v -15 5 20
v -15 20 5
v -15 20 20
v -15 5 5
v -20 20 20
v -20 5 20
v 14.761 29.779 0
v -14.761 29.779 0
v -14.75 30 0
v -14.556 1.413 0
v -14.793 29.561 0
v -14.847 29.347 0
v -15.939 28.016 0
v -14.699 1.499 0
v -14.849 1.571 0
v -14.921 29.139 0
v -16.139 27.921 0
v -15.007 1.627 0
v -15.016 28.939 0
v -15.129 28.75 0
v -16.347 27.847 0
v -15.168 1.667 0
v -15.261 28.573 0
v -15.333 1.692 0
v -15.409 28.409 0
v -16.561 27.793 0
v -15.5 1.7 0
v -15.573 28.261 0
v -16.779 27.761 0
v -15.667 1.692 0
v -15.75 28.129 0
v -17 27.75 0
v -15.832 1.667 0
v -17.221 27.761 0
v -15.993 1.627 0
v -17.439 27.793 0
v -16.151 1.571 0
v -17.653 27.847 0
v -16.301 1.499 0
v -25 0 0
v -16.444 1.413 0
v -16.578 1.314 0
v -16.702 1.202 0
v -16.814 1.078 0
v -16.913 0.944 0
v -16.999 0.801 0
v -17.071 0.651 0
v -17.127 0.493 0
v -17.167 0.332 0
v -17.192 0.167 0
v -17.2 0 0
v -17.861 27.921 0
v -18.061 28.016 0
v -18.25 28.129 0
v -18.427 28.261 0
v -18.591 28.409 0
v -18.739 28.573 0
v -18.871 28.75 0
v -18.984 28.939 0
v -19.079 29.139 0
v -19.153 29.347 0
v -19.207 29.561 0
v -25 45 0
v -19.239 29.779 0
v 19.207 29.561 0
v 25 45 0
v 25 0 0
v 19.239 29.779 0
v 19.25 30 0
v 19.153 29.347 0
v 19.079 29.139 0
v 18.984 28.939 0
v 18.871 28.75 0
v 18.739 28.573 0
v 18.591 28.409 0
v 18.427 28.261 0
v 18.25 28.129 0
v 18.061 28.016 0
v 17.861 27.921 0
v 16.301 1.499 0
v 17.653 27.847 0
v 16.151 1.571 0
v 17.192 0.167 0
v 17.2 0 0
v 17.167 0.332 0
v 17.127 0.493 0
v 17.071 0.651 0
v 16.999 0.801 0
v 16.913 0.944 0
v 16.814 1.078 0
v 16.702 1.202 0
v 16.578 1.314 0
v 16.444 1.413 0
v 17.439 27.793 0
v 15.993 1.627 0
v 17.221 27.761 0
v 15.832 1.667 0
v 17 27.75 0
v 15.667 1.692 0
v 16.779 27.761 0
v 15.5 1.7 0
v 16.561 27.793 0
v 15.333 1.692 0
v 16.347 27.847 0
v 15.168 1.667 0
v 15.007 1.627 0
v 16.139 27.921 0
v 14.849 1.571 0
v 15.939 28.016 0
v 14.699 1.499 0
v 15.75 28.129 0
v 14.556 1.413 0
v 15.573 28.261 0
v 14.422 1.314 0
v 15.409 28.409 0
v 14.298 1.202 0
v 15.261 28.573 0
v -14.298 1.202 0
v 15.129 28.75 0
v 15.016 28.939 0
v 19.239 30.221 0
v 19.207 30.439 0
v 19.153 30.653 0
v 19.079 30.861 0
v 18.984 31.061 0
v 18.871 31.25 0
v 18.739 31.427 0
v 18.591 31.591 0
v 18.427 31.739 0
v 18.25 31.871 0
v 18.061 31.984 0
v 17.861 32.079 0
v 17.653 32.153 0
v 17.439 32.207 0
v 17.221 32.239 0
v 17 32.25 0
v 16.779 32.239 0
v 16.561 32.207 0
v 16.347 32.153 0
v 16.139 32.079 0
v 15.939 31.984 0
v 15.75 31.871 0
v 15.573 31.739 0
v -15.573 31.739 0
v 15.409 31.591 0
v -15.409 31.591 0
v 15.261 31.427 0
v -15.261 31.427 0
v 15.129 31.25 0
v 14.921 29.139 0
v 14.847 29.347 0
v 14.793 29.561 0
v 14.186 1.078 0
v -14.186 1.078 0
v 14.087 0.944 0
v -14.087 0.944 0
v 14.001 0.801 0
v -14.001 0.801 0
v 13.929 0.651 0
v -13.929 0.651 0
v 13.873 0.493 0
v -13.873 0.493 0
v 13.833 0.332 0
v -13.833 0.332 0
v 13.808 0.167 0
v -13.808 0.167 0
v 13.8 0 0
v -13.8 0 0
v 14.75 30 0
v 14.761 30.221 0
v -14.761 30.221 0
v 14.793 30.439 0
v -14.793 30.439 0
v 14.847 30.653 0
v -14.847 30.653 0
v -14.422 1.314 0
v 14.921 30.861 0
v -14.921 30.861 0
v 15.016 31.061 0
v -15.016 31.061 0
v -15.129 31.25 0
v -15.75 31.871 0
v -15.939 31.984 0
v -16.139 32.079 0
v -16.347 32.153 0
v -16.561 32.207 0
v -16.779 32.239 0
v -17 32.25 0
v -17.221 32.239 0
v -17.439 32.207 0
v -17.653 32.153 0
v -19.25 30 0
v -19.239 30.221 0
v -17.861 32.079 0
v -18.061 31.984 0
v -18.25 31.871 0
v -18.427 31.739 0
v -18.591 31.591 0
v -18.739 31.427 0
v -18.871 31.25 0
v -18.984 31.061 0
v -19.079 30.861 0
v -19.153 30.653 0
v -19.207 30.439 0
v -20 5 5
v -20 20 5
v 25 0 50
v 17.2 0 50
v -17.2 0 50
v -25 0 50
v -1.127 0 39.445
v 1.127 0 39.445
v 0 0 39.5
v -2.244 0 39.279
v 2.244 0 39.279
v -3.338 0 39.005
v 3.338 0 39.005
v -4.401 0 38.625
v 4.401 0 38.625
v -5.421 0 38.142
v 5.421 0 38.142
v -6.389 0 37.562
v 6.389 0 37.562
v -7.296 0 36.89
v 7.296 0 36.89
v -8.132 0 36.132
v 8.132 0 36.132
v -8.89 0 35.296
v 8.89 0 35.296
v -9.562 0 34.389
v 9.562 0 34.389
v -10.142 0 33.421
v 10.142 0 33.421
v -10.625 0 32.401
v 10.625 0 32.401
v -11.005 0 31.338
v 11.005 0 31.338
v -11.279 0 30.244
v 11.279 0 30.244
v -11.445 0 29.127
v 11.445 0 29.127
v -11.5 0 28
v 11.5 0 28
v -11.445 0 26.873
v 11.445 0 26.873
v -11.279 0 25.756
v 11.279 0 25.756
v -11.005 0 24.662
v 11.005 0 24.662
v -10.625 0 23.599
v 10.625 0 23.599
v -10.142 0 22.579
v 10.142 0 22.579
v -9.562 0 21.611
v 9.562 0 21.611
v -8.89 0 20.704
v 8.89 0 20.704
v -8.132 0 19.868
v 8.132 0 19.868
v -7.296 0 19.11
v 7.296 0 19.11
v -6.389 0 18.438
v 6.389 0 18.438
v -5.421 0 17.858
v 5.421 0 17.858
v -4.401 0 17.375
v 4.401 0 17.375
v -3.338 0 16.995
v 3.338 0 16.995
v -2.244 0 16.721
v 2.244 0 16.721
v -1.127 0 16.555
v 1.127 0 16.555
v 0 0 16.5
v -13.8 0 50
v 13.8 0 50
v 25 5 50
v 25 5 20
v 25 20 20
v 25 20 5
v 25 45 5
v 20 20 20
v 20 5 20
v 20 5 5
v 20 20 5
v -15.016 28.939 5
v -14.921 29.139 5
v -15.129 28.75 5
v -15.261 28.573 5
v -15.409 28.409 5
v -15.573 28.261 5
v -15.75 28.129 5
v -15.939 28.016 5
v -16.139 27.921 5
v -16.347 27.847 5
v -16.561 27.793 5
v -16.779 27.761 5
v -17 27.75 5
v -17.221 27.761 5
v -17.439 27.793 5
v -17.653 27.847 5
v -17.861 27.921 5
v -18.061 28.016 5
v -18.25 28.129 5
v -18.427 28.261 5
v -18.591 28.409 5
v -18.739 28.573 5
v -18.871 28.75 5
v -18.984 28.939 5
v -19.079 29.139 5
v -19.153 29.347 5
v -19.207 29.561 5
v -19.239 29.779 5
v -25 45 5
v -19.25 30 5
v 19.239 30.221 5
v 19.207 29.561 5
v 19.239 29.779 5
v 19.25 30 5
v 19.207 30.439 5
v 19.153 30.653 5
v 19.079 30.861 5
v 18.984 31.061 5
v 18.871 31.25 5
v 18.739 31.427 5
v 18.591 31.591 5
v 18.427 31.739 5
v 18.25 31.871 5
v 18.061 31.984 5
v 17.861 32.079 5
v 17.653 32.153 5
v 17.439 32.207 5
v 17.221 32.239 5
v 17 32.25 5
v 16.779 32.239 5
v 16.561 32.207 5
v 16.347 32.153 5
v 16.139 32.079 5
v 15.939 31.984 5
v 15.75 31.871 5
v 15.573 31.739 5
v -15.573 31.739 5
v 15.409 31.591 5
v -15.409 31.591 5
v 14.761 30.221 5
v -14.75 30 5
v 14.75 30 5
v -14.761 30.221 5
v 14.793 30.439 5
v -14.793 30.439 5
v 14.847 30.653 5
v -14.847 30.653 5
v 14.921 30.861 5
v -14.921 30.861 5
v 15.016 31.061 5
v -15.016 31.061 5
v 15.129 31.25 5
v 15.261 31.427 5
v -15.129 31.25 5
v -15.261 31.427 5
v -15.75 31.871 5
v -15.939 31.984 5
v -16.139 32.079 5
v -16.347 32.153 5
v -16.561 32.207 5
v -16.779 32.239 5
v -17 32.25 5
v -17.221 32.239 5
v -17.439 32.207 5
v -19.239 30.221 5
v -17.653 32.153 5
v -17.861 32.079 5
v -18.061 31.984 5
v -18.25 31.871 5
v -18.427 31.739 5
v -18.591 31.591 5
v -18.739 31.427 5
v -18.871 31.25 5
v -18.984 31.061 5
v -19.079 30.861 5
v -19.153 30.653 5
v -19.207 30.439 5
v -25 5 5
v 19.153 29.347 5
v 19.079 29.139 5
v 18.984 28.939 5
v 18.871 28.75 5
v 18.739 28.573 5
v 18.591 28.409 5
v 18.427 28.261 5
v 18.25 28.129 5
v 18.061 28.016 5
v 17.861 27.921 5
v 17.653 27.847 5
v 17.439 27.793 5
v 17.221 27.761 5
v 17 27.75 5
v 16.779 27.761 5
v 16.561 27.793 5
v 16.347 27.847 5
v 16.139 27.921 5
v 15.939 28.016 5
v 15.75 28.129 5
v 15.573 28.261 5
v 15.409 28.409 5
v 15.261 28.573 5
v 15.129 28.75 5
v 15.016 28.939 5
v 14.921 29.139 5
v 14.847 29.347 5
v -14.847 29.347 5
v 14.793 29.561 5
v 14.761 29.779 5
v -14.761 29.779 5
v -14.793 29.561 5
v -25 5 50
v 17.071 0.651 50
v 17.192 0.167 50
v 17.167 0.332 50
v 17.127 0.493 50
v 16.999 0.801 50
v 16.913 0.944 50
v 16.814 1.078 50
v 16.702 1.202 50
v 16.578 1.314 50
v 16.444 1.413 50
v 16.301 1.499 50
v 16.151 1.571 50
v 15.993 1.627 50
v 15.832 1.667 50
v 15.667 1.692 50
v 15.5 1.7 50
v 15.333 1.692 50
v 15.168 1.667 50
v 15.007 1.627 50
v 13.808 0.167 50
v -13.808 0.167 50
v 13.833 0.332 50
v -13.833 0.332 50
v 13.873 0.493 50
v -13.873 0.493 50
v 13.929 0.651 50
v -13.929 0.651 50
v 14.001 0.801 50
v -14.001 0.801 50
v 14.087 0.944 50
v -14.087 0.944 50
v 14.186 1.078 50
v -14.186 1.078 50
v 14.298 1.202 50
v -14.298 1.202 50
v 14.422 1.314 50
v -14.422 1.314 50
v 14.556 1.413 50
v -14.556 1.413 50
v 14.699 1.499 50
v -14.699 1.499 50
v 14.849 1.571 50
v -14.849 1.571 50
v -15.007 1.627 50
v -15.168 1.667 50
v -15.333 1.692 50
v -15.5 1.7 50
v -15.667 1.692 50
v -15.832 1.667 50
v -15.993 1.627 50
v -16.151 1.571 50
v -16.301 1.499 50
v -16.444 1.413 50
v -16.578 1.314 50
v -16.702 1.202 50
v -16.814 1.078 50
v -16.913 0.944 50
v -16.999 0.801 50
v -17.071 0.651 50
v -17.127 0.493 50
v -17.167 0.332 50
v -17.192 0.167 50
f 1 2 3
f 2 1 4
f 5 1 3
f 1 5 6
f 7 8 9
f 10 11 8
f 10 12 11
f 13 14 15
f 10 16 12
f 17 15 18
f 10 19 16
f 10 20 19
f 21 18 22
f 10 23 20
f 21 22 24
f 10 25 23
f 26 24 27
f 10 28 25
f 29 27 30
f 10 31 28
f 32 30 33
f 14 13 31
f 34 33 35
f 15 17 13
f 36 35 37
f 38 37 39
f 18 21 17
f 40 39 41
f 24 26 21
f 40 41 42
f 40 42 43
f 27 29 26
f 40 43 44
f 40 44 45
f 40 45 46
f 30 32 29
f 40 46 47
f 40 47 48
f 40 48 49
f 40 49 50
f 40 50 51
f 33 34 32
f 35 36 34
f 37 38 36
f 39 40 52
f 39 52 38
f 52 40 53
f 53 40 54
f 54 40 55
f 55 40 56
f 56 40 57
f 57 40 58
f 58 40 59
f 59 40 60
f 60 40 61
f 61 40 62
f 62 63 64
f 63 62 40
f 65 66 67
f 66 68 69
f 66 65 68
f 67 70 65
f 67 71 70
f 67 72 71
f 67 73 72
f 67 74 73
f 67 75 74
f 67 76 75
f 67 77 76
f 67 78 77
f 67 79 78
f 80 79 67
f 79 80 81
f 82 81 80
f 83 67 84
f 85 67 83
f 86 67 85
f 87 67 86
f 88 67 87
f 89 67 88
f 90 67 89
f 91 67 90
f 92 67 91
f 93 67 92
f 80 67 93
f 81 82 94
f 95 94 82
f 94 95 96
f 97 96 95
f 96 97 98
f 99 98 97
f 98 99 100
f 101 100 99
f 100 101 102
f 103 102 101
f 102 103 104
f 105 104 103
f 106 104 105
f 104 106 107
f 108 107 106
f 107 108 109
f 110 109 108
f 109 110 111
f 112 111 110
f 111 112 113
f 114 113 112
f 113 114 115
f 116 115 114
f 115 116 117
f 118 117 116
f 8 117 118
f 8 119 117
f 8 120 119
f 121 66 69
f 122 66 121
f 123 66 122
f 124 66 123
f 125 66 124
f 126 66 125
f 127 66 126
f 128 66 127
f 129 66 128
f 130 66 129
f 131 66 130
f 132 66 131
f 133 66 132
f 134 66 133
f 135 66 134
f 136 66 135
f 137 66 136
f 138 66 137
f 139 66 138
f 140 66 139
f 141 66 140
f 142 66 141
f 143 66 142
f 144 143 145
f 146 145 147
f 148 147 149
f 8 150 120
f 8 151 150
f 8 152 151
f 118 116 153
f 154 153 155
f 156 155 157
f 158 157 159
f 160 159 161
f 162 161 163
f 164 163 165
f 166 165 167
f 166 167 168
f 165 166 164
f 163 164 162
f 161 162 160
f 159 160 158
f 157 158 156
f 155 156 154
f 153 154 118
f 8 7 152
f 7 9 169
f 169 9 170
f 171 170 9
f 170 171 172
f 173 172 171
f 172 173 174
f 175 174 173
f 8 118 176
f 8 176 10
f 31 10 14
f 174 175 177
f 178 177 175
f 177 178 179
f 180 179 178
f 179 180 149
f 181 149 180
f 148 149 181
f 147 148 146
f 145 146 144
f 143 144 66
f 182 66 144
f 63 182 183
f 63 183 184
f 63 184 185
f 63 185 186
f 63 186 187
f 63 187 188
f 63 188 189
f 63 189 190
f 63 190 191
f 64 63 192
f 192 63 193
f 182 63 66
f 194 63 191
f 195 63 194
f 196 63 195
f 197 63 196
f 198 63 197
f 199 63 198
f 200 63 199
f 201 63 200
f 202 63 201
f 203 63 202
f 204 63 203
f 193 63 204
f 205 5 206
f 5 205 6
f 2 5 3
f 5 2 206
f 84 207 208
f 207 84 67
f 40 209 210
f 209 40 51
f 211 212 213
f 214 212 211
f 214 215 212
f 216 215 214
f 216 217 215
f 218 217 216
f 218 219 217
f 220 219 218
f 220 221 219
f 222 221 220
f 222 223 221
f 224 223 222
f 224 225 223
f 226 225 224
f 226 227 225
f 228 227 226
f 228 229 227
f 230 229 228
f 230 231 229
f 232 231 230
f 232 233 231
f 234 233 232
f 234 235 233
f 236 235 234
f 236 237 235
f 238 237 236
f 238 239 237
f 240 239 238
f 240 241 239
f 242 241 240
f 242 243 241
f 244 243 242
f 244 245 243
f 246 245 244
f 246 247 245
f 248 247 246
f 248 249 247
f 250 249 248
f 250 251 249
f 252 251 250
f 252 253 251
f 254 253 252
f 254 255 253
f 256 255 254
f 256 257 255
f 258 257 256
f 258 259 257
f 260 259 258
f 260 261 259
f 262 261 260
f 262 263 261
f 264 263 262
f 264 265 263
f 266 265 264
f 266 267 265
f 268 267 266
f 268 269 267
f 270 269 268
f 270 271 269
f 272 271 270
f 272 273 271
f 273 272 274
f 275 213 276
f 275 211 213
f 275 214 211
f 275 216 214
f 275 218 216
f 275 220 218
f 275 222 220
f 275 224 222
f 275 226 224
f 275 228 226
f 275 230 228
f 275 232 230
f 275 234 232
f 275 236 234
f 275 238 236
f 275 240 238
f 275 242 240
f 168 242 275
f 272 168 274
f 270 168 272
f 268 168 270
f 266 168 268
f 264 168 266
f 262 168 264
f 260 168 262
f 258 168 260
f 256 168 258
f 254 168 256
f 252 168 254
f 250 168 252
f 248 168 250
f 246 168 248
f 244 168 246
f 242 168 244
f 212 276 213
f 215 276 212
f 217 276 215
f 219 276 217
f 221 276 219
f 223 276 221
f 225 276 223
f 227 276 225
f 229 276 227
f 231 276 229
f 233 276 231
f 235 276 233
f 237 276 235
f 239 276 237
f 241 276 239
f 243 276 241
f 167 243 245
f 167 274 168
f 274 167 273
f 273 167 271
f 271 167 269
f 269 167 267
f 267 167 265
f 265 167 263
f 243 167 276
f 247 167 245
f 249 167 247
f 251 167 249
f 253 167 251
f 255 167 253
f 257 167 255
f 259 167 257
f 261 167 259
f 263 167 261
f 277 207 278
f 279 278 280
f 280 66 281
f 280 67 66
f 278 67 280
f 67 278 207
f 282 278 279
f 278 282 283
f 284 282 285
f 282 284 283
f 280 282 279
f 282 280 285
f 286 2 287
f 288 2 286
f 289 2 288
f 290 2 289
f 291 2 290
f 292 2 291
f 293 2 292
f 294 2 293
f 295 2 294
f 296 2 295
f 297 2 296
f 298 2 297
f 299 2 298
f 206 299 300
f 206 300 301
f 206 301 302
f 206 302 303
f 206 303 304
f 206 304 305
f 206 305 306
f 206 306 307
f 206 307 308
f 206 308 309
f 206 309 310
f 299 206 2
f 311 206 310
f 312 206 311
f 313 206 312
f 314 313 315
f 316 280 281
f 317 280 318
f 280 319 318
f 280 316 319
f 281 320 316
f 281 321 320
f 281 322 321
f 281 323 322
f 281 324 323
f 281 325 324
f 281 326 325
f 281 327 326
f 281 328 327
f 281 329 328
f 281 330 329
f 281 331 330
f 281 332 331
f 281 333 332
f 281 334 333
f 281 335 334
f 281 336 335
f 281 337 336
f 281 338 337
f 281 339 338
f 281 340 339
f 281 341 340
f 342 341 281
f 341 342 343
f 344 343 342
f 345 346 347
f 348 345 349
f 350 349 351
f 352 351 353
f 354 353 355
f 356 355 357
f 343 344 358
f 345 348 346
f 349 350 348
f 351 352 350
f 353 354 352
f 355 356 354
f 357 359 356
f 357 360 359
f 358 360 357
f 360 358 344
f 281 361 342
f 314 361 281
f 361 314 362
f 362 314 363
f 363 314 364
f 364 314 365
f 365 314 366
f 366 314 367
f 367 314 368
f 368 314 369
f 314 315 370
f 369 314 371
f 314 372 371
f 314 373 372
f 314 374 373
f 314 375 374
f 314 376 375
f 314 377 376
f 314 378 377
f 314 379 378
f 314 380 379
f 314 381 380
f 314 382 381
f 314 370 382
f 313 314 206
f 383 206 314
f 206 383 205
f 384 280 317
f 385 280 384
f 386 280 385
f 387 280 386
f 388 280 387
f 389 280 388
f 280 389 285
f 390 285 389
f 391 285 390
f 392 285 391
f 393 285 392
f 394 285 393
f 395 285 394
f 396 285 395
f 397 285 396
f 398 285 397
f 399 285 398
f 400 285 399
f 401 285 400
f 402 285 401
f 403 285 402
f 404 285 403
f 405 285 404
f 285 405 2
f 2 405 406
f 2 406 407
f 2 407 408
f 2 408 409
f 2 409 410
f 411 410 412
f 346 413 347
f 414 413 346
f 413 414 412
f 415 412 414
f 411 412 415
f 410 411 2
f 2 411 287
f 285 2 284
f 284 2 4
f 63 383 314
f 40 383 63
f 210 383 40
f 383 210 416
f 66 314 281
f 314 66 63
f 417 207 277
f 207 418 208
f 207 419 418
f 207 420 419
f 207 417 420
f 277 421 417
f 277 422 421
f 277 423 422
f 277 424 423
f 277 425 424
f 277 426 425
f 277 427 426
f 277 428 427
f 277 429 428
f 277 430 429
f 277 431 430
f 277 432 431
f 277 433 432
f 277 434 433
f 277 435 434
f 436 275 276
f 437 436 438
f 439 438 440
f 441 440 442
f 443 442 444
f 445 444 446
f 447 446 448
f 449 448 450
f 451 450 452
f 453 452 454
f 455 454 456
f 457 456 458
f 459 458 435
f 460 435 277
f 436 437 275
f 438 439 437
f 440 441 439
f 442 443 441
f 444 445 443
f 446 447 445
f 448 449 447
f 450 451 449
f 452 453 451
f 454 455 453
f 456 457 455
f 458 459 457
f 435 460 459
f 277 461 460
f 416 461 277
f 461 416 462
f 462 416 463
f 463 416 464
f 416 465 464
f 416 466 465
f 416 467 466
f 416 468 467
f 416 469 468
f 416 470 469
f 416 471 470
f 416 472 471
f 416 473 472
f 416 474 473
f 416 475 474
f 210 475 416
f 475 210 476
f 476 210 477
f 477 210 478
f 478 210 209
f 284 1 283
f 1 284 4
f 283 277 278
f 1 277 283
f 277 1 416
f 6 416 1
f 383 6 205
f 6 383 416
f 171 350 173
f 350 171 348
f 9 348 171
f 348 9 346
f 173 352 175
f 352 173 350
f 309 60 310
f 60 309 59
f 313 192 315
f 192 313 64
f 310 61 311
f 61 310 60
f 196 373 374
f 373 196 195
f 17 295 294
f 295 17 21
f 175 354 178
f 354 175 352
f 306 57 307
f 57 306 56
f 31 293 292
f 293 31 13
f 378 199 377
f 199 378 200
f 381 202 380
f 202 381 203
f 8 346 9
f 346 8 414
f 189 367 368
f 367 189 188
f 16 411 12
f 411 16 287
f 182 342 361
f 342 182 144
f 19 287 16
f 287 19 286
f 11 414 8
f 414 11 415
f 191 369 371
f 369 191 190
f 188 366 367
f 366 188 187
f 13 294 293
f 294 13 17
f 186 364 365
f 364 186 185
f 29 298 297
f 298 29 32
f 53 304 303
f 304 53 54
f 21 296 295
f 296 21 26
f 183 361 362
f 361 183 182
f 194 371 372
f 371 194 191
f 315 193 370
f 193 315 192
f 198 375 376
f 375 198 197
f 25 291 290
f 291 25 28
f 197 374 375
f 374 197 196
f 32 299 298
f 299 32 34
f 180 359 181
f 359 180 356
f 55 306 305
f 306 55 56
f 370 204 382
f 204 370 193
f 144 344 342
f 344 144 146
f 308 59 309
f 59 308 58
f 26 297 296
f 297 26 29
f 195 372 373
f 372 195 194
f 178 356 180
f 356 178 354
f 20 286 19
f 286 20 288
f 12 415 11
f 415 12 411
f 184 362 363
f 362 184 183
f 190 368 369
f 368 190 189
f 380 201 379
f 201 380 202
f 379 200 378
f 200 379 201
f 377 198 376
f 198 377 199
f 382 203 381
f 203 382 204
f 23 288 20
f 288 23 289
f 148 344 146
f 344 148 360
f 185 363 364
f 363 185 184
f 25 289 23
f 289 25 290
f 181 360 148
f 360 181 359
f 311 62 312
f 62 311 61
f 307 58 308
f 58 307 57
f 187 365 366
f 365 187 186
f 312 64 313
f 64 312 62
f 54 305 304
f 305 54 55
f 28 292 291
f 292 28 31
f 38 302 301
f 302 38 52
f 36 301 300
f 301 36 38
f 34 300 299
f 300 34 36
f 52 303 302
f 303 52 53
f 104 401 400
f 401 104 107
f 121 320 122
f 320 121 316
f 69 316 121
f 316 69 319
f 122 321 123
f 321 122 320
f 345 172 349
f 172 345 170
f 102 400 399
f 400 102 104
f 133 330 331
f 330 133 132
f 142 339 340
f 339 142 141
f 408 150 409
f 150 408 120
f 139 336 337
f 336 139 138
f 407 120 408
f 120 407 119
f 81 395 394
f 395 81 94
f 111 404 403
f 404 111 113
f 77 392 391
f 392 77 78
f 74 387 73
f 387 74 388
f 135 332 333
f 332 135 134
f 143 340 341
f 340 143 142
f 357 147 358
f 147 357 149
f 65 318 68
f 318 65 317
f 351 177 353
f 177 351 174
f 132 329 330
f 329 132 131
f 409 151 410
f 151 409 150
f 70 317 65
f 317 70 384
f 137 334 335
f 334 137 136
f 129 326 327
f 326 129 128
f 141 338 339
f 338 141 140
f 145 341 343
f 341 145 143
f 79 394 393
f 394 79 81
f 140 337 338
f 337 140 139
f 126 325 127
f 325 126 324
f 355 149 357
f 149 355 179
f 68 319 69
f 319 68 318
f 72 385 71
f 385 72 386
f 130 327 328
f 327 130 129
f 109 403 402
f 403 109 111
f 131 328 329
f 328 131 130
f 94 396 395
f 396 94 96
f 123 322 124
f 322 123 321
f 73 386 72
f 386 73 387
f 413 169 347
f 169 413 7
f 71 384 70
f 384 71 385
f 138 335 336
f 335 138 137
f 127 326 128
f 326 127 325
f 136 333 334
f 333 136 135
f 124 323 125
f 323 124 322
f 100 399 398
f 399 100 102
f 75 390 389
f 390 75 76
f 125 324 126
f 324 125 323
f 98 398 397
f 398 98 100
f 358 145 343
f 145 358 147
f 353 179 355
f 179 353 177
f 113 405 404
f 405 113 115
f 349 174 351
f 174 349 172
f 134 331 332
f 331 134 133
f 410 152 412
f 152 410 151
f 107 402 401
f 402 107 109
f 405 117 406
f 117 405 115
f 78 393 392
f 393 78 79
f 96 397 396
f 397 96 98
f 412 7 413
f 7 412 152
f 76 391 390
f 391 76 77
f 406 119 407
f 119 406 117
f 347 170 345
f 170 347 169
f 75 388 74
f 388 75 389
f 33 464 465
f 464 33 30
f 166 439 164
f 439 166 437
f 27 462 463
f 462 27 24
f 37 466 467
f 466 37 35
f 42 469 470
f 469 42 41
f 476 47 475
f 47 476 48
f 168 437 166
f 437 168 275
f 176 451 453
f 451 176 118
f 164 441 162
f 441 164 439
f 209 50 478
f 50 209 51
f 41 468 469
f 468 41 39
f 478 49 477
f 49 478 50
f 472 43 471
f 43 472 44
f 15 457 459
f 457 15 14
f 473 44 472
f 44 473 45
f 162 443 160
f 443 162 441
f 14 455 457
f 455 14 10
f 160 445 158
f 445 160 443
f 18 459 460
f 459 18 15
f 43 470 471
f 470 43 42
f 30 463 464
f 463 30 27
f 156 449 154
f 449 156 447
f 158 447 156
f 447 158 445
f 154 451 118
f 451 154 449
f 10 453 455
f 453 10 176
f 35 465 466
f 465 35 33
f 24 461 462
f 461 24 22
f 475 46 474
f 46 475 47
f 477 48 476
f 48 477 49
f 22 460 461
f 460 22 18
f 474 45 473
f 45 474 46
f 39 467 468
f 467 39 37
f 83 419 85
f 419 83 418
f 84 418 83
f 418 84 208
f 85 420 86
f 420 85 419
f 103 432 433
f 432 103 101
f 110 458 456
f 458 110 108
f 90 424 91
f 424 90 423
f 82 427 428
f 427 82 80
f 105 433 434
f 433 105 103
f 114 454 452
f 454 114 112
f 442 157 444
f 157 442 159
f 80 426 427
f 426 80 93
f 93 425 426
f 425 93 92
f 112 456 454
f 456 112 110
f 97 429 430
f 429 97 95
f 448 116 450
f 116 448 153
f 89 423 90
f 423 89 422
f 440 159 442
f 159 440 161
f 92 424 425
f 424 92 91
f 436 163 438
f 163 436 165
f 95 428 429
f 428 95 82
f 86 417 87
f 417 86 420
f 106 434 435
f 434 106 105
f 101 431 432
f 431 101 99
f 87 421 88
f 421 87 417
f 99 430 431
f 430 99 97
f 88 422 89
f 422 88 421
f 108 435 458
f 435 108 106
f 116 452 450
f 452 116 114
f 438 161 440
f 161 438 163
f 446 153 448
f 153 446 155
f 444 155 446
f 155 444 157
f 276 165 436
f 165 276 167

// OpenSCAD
// L-shaped mounting bracket for a NEMA 17 stepper motor (e.g. syringe pump)
// Print orientation: base plate on the bed, motor plate building upward (+Z)

$fn = 64;

// ---------------- Dimensions (mm) ----------------
// Base plate
base_x0      = -25;   // plate x start
base_x1      = 25;    // plate x end
base_y0      = 0;     // plate y start
base_y1      = 45;    // plate y end
base_z       = 5;     // plate thickness (z)

// Motor plate
motor_x0     = -25;   // plate x start
motor_x1     = 25;    // plate x end
motor_y0     = 0;     // plate y start
motor_y1     = 5;     // plate y end
motor_z      = 50;    // plate height (z)

// Through-holes
hole_m4_x1   = -17;   // M4 hole x position (left)
hole_m4_y    = 30;    // M4 hole y position
hole_m4_d    = 4.5;   // M4 hole diameter
hole_m4_x2   = 17;    // M4 hole x position (right)

// Boss hole (motor centring boss)
boss_d       = 23;    // boss hole diameter
boss_x       = 0;     // boss hole centre x
boss_z       = 28;    // boss hole centre z

// Screw holes (M3, on square pattern)
screw_d      = 3.4;   // screw hole diameter
screw_pitch  = 31;    // square pattern side length
screw_count  = 4;     // number of screw holes

// Gussets
gusset_t     = 5;     // gusset thickness (x)
gusset_leg   = 20;    // right triangle leg length (along +Y and +Z)

// ---------------- Model ----------------
difference() {
    union() {
        // Base plate
        translate([base_x0, base_y0, 0])
            cube([base_x1 - base_x0, base_y1 - base_y0, base_z]);

        // Motor plate, standing on the back edge of the base
        translate([motor_x0, motor_y0, 0])
            cube([motor_x1 - motor_x0, motor_y1 - motor_y0, motor_z]);

        // Gussets, flush with the left and right edges
        for (sx = [-1, 1])
            translate([sx * (base_x1 - gusset_t), motor_y0, 0])
                cube([gusset_t, gusset_leg, gusset_leg]);
    }

    // Through-holes in the base plate
    for (x = [hole_m4_x1, hole_m4_x2])
        translate([x, hole_m4_y, -1])
            cylinder(d = hole_m4_d, h = base_z + 2);

    // Boss hole through the motor plate (along Y)
    translate([boss_x, 0, boss_z])
        rotate([90, 0, 0])
            cylinder(d = boss_d, h = motor_y1 - motor_y0 + 2);

    // Screw holes on a square pattern, centred on the boss hole
    for (i = [0 : screw_count - 1]) {
        x = (i % 2 == 0) ? -screw_pitch / 2 : screw_pitch / 2;
        z = (i < 2) ? -screw_pitch / 2 : screw_pitch / 2;
        translate([x, 0, z])
            cylinder(d = screw_d, h = motor_z + 2);
    }
}
